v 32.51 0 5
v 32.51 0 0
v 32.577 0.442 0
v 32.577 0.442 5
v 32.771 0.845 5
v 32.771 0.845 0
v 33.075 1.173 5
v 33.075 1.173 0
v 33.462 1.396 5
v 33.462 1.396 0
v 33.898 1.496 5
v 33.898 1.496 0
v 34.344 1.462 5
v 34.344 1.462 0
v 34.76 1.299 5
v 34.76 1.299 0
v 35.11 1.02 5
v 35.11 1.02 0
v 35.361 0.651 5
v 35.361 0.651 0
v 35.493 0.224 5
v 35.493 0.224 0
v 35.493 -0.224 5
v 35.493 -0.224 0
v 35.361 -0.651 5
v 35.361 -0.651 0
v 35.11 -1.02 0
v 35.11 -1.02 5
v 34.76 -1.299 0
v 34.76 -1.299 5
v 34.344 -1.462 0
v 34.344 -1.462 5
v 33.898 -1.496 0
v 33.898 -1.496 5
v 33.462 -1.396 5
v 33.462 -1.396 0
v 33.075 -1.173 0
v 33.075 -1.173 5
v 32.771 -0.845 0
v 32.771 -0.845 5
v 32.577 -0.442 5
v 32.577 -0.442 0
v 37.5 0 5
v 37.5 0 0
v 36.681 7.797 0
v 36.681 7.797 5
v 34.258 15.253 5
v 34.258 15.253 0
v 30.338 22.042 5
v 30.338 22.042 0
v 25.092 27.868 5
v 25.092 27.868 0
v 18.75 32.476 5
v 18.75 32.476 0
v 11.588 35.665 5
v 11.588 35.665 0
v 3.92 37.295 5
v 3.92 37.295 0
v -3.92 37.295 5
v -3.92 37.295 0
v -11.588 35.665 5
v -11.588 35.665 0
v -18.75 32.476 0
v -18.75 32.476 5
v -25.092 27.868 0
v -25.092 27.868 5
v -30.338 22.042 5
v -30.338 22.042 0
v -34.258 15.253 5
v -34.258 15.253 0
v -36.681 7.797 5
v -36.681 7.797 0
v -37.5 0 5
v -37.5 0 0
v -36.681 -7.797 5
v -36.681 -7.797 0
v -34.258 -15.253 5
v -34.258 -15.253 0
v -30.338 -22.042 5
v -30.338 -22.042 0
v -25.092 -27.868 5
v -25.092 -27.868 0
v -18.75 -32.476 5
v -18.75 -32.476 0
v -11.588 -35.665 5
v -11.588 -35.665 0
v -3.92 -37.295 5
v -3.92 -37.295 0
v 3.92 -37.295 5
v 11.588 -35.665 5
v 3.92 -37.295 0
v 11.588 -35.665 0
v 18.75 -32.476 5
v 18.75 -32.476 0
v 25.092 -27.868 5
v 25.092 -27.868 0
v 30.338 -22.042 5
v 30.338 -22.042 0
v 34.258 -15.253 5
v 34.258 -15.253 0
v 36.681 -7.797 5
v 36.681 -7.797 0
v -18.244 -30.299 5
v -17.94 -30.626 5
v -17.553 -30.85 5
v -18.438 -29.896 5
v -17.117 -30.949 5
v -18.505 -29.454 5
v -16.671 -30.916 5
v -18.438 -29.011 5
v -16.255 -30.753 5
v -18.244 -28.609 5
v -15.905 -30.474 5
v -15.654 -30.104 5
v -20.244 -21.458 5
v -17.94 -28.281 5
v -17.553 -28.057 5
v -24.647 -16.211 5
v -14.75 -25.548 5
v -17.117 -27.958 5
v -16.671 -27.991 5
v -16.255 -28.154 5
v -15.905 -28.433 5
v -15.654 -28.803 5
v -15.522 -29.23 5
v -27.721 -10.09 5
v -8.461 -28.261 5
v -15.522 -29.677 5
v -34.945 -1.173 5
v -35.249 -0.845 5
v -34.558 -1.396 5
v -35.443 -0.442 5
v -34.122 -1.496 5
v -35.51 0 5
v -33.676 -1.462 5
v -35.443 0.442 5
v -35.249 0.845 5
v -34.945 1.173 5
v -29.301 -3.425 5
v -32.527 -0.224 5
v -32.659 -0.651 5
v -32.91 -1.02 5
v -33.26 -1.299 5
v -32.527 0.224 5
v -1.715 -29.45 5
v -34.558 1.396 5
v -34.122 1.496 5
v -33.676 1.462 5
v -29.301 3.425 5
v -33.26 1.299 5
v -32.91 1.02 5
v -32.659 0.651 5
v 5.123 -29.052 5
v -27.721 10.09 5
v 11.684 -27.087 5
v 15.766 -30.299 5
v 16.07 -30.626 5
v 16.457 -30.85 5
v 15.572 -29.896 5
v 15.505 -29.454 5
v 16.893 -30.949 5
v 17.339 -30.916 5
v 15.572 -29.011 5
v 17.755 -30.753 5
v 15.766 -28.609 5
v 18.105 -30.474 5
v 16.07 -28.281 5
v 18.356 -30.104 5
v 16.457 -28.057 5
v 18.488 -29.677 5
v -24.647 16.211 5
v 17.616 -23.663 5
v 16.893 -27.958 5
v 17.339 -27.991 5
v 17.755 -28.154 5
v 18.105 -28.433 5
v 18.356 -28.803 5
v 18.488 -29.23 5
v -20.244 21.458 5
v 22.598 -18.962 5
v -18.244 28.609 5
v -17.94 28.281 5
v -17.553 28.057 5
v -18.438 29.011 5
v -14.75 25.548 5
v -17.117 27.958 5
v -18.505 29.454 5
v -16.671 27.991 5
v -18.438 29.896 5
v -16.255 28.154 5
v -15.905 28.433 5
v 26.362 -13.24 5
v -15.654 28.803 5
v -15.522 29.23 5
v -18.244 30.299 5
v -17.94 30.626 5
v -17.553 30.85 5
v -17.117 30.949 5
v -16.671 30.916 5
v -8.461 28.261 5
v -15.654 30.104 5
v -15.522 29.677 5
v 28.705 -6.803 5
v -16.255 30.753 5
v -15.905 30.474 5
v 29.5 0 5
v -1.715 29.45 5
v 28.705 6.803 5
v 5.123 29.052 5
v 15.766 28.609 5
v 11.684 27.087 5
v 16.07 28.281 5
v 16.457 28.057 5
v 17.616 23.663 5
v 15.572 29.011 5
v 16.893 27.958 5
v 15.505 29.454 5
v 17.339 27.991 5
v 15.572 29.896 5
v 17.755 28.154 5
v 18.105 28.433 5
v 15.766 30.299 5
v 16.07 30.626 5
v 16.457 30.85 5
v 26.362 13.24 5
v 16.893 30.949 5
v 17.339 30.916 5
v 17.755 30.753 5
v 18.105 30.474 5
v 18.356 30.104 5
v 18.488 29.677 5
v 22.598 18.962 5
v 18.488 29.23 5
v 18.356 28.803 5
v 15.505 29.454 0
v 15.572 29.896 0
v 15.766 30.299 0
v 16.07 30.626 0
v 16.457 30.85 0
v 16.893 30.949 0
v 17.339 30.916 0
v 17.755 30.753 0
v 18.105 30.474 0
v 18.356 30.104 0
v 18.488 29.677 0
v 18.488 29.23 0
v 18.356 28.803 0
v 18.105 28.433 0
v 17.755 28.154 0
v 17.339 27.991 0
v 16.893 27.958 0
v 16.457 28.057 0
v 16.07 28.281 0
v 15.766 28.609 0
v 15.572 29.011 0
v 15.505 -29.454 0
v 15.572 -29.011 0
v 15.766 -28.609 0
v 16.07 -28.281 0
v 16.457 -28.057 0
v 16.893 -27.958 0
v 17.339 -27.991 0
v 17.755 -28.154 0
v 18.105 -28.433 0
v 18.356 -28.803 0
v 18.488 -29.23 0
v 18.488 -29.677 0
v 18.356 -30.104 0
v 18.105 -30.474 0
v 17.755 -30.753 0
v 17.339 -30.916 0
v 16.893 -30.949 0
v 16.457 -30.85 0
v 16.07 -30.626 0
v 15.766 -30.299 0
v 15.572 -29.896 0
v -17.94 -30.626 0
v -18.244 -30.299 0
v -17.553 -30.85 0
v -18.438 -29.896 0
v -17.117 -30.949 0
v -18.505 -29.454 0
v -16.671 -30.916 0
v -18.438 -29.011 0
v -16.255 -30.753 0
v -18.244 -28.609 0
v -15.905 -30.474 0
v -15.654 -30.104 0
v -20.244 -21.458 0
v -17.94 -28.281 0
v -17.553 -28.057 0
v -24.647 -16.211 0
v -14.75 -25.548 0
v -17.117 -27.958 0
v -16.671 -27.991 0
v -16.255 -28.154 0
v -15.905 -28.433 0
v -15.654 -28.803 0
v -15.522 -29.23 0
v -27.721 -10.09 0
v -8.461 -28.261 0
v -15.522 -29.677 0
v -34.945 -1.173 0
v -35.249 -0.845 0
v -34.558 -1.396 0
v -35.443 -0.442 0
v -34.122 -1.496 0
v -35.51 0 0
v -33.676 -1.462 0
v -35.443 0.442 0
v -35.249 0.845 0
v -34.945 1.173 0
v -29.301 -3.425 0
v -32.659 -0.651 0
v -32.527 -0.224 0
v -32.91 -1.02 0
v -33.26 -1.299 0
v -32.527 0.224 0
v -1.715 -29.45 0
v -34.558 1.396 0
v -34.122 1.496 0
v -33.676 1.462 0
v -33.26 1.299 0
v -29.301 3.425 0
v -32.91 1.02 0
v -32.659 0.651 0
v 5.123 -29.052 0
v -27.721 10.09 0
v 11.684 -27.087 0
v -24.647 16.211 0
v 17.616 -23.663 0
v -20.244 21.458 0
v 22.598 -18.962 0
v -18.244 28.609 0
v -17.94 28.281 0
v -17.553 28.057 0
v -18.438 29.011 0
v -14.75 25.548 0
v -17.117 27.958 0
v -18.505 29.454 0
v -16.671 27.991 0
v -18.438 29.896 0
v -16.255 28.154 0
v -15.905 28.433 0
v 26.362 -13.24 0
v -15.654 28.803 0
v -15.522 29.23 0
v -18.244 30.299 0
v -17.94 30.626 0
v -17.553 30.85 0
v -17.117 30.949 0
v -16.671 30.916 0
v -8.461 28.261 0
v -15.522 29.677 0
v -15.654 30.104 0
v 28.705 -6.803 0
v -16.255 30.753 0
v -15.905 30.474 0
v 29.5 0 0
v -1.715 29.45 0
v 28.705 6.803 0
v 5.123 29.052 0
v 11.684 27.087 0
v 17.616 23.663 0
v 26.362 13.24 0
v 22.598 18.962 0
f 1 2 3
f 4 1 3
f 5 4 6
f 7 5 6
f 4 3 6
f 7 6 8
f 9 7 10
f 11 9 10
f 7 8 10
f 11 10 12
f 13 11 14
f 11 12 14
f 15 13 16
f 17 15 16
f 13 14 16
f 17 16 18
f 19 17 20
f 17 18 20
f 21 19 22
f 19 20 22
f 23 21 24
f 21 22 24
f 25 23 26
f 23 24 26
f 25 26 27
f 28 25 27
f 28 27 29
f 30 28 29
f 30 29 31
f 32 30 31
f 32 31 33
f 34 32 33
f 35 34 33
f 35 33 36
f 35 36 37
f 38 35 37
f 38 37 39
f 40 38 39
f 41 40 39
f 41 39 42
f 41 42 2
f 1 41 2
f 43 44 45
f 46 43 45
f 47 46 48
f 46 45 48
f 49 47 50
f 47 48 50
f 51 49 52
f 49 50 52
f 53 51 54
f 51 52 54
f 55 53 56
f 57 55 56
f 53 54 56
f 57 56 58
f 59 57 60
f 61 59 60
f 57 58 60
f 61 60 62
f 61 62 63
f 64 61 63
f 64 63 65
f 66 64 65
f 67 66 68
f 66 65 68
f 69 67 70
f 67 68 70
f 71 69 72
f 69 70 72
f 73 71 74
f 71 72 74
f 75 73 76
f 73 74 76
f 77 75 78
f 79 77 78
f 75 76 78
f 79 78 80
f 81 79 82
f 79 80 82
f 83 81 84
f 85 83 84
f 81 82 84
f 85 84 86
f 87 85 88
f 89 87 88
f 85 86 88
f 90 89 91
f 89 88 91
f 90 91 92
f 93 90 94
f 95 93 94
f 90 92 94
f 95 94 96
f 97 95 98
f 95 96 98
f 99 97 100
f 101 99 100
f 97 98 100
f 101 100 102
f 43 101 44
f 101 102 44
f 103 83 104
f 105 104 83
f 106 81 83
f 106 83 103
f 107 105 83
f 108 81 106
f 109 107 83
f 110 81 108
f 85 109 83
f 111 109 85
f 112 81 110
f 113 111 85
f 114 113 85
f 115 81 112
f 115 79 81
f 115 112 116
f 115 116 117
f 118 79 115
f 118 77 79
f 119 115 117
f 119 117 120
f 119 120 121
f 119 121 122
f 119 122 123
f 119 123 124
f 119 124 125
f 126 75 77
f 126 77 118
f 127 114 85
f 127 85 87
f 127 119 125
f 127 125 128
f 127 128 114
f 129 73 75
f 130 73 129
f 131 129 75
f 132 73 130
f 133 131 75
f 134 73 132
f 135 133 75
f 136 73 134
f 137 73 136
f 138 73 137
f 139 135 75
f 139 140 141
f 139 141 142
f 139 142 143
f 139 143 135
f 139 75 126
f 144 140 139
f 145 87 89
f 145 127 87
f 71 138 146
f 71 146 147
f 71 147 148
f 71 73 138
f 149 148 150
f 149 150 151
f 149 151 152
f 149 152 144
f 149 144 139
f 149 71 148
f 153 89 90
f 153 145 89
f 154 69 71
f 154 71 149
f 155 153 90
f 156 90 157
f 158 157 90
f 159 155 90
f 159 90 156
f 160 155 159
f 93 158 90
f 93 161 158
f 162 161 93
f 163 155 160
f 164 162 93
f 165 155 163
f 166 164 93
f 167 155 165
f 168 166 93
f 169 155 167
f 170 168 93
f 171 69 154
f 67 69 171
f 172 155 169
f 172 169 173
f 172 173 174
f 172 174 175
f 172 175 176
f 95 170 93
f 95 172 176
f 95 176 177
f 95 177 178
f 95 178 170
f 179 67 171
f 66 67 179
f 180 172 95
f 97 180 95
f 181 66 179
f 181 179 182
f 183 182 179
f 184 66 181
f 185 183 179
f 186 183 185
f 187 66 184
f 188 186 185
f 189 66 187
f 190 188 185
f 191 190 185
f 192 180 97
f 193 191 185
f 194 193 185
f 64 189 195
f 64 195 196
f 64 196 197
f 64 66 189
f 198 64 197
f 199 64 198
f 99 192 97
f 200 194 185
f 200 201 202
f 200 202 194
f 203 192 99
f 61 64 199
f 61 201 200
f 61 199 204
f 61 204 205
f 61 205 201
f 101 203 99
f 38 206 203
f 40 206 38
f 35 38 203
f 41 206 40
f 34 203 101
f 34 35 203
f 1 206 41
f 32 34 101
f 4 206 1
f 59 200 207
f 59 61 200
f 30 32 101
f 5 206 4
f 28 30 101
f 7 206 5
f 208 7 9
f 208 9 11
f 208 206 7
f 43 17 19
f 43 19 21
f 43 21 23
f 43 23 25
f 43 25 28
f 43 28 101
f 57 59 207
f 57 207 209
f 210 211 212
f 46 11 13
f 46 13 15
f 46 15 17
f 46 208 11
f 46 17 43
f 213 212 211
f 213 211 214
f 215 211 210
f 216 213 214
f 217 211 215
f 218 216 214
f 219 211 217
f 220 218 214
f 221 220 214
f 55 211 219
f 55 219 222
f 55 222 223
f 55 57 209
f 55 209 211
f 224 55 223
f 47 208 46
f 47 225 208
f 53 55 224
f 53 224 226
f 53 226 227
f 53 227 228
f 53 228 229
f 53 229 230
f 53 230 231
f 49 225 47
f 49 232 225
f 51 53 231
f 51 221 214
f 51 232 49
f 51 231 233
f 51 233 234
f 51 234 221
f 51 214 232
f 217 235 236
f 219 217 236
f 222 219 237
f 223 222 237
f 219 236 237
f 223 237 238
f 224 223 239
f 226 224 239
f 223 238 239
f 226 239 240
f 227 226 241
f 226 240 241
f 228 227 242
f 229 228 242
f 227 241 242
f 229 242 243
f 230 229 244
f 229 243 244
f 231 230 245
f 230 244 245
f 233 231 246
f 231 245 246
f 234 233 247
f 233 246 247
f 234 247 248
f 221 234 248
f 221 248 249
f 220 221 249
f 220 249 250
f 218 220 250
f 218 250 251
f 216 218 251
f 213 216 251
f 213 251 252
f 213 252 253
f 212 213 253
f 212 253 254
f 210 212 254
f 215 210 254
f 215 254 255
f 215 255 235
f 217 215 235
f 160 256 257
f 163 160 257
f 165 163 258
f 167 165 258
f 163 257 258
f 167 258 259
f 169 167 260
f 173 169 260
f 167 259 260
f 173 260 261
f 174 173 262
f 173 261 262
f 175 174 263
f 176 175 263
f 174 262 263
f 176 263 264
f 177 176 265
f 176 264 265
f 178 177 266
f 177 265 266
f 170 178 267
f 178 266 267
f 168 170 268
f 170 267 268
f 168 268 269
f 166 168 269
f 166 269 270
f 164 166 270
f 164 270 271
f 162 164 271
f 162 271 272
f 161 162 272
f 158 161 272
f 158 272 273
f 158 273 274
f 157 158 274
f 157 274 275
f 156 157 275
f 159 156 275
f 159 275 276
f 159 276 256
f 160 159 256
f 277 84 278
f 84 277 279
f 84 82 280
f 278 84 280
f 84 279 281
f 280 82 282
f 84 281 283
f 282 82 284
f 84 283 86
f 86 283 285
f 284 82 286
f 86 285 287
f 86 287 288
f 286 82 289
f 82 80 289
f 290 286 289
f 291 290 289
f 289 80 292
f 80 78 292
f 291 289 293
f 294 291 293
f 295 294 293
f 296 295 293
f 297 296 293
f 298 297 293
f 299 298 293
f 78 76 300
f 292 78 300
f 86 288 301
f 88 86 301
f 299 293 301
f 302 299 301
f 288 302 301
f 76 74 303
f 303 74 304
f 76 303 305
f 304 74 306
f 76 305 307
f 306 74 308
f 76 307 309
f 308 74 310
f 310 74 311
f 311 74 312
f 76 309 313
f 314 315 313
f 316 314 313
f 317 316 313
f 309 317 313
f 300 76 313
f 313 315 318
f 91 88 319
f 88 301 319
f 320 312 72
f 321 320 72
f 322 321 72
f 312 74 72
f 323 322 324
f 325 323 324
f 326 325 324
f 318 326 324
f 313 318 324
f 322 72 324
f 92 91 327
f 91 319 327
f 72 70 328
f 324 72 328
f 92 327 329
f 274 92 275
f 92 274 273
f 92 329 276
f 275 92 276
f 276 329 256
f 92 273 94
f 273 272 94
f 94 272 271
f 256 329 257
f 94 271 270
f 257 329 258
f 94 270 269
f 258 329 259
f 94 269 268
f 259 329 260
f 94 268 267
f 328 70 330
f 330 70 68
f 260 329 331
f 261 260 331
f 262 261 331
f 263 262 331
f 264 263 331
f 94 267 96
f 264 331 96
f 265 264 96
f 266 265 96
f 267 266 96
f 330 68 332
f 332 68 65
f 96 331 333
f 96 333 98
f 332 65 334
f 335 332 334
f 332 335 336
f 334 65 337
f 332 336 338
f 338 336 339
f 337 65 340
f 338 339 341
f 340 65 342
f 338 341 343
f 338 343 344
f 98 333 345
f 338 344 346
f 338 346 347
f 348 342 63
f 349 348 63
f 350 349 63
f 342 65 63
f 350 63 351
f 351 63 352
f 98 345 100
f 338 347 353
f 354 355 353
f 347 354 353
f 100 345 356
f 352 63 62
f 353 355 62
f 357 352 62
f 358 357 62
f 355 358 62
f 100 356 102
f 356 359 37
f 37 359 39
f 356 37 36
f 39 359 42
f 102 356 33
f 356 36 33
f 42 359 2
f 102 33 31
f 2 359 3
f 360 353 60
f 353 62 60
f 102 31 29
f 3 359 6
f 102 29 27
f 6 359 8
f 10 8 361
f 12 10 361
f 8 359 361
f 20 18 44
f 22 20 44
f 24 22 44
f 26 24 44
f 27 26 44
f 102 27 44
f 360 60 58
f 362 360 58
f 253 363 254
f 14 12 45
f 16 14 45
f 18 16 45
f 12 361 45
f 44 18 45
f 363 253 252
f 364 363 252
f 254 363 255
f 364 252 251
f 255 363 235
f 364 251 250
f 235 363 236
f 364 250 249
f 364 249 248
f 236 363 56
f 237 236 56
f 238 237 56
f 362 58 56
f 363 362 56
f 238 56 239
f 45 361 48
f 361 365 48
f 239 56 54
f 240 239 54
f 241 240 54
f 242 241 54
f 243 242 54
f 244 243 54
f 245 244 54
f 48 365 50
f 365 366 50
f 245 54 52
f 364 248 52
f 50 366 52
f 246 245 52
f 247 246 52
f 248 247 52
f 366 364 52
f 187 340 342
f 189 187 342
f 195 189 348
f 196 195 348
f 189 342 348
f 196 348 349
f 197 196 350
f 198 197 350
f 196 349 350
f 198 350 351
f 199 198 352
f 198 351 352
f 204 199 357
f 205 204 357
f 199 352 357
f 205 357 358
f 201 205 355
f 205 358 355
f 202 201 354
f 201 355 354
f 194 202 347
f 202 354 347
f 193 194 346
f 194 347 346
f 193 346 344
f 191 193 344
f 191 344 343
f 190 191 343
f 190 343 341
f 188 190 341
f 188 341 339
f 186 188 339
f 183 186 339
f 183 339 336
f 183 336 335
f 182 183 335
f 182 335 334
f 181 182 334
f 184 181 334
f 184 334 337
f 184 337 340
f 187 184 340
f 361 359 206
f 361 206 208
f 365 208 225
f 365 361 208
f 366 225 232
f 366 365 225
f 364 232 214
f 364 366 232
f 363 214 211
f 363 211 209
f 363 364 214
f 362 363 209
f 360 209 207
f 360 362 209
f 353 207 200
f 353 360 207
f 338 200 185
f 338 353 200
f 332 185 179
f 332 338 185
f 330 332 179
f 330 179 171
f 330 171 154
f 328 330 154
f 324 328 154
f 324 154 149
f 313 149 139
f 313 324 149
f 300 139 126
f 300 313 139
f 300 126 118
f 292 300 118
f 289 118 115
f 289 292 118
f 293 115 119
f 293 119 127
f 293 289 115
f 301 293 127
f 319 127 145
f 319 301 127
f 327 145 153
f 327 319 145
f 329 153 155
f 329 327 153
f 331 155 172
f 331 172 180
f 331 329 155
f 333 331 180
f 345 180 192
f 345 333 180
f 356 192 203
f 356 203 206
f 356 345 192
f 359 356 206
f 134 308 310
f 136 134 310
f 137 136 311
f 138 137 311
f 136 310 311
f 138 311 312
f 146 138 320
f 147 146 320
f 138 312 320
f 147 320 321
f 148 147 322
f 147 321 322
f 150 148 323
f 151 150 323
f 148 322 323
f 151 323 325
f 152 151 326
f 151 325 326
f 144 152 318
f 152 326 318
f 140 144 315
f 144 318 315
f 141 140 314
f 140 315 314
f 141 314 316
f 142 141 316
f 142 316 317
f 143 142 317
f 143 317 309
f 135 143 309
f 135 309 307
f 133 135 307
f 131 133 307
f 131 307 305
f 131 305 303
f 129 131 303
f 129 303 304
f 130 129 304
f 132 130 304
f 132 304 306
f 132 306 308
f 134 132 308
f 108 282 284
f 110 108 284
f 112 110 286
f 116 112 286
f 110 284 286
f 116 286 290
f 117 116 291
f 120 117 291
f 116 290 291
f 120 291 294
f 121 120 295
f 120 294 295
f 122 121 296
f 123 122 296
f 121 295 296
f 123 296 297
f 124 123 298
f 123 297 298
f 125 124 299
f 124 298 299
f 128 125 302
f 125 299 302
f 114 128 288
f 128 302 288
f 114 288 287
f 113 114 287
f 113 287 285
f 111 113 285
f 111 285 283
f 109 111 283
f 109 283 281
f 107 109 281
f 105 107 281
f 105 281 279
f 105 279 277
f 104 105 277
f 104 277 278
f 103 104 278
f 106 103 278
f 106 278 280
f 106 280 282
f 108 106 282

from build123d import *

# Parameters (mm, degrees)
SKETCH1_R           = 37.5
SKETCH1_R_2         = 29.5
BOSS_EXTRUDE1_DEPTH = 5
SKETCH2_R           = 1.5
CUT_EXTRUDE1_DEPTH  = 11


with BuildPart() as part:
    # Sketch1 → Boss-Extrude1 (new body)
    with BuildSketch(Plane.XY):
        Circle(SKETCH1_R)
        Circle(SKETCH1_R_2, mode=Mode.SUBTRACT)
    extrude(amount=BOSS_EXTRUDE1_DEPTH)

    # Sketch2 → Cut-Extrude1 (cut)
    with BuildSketch(Plane(origin=(0, 0, 0), x_dir=(-1, 0, 0), z_dir=(0, 0, -1))):
        with Locations((-17.005, 29.453523983)):
            Circle(SKETCH2_R)
        with Locations((17.005, 29.453523983)):
            Circle(SKETCH2_R)
        with Locations((34.01, 0)):
            Circle(SKETCH2_R)
        with Locations((17.005, -29.453523983)):
            Circle(SKETCH2_R)
        with Locations((-17.005, -29.453523983)):
            Circle(SKETCH2_R)
        with Locations((-34.01, 0)):
            Circle(SKETCH2_R)
    extrude(amount=-CUT_EXTRUDE1_DEPTH, mode=Mode.SUBTRACT)


solid = part.part
